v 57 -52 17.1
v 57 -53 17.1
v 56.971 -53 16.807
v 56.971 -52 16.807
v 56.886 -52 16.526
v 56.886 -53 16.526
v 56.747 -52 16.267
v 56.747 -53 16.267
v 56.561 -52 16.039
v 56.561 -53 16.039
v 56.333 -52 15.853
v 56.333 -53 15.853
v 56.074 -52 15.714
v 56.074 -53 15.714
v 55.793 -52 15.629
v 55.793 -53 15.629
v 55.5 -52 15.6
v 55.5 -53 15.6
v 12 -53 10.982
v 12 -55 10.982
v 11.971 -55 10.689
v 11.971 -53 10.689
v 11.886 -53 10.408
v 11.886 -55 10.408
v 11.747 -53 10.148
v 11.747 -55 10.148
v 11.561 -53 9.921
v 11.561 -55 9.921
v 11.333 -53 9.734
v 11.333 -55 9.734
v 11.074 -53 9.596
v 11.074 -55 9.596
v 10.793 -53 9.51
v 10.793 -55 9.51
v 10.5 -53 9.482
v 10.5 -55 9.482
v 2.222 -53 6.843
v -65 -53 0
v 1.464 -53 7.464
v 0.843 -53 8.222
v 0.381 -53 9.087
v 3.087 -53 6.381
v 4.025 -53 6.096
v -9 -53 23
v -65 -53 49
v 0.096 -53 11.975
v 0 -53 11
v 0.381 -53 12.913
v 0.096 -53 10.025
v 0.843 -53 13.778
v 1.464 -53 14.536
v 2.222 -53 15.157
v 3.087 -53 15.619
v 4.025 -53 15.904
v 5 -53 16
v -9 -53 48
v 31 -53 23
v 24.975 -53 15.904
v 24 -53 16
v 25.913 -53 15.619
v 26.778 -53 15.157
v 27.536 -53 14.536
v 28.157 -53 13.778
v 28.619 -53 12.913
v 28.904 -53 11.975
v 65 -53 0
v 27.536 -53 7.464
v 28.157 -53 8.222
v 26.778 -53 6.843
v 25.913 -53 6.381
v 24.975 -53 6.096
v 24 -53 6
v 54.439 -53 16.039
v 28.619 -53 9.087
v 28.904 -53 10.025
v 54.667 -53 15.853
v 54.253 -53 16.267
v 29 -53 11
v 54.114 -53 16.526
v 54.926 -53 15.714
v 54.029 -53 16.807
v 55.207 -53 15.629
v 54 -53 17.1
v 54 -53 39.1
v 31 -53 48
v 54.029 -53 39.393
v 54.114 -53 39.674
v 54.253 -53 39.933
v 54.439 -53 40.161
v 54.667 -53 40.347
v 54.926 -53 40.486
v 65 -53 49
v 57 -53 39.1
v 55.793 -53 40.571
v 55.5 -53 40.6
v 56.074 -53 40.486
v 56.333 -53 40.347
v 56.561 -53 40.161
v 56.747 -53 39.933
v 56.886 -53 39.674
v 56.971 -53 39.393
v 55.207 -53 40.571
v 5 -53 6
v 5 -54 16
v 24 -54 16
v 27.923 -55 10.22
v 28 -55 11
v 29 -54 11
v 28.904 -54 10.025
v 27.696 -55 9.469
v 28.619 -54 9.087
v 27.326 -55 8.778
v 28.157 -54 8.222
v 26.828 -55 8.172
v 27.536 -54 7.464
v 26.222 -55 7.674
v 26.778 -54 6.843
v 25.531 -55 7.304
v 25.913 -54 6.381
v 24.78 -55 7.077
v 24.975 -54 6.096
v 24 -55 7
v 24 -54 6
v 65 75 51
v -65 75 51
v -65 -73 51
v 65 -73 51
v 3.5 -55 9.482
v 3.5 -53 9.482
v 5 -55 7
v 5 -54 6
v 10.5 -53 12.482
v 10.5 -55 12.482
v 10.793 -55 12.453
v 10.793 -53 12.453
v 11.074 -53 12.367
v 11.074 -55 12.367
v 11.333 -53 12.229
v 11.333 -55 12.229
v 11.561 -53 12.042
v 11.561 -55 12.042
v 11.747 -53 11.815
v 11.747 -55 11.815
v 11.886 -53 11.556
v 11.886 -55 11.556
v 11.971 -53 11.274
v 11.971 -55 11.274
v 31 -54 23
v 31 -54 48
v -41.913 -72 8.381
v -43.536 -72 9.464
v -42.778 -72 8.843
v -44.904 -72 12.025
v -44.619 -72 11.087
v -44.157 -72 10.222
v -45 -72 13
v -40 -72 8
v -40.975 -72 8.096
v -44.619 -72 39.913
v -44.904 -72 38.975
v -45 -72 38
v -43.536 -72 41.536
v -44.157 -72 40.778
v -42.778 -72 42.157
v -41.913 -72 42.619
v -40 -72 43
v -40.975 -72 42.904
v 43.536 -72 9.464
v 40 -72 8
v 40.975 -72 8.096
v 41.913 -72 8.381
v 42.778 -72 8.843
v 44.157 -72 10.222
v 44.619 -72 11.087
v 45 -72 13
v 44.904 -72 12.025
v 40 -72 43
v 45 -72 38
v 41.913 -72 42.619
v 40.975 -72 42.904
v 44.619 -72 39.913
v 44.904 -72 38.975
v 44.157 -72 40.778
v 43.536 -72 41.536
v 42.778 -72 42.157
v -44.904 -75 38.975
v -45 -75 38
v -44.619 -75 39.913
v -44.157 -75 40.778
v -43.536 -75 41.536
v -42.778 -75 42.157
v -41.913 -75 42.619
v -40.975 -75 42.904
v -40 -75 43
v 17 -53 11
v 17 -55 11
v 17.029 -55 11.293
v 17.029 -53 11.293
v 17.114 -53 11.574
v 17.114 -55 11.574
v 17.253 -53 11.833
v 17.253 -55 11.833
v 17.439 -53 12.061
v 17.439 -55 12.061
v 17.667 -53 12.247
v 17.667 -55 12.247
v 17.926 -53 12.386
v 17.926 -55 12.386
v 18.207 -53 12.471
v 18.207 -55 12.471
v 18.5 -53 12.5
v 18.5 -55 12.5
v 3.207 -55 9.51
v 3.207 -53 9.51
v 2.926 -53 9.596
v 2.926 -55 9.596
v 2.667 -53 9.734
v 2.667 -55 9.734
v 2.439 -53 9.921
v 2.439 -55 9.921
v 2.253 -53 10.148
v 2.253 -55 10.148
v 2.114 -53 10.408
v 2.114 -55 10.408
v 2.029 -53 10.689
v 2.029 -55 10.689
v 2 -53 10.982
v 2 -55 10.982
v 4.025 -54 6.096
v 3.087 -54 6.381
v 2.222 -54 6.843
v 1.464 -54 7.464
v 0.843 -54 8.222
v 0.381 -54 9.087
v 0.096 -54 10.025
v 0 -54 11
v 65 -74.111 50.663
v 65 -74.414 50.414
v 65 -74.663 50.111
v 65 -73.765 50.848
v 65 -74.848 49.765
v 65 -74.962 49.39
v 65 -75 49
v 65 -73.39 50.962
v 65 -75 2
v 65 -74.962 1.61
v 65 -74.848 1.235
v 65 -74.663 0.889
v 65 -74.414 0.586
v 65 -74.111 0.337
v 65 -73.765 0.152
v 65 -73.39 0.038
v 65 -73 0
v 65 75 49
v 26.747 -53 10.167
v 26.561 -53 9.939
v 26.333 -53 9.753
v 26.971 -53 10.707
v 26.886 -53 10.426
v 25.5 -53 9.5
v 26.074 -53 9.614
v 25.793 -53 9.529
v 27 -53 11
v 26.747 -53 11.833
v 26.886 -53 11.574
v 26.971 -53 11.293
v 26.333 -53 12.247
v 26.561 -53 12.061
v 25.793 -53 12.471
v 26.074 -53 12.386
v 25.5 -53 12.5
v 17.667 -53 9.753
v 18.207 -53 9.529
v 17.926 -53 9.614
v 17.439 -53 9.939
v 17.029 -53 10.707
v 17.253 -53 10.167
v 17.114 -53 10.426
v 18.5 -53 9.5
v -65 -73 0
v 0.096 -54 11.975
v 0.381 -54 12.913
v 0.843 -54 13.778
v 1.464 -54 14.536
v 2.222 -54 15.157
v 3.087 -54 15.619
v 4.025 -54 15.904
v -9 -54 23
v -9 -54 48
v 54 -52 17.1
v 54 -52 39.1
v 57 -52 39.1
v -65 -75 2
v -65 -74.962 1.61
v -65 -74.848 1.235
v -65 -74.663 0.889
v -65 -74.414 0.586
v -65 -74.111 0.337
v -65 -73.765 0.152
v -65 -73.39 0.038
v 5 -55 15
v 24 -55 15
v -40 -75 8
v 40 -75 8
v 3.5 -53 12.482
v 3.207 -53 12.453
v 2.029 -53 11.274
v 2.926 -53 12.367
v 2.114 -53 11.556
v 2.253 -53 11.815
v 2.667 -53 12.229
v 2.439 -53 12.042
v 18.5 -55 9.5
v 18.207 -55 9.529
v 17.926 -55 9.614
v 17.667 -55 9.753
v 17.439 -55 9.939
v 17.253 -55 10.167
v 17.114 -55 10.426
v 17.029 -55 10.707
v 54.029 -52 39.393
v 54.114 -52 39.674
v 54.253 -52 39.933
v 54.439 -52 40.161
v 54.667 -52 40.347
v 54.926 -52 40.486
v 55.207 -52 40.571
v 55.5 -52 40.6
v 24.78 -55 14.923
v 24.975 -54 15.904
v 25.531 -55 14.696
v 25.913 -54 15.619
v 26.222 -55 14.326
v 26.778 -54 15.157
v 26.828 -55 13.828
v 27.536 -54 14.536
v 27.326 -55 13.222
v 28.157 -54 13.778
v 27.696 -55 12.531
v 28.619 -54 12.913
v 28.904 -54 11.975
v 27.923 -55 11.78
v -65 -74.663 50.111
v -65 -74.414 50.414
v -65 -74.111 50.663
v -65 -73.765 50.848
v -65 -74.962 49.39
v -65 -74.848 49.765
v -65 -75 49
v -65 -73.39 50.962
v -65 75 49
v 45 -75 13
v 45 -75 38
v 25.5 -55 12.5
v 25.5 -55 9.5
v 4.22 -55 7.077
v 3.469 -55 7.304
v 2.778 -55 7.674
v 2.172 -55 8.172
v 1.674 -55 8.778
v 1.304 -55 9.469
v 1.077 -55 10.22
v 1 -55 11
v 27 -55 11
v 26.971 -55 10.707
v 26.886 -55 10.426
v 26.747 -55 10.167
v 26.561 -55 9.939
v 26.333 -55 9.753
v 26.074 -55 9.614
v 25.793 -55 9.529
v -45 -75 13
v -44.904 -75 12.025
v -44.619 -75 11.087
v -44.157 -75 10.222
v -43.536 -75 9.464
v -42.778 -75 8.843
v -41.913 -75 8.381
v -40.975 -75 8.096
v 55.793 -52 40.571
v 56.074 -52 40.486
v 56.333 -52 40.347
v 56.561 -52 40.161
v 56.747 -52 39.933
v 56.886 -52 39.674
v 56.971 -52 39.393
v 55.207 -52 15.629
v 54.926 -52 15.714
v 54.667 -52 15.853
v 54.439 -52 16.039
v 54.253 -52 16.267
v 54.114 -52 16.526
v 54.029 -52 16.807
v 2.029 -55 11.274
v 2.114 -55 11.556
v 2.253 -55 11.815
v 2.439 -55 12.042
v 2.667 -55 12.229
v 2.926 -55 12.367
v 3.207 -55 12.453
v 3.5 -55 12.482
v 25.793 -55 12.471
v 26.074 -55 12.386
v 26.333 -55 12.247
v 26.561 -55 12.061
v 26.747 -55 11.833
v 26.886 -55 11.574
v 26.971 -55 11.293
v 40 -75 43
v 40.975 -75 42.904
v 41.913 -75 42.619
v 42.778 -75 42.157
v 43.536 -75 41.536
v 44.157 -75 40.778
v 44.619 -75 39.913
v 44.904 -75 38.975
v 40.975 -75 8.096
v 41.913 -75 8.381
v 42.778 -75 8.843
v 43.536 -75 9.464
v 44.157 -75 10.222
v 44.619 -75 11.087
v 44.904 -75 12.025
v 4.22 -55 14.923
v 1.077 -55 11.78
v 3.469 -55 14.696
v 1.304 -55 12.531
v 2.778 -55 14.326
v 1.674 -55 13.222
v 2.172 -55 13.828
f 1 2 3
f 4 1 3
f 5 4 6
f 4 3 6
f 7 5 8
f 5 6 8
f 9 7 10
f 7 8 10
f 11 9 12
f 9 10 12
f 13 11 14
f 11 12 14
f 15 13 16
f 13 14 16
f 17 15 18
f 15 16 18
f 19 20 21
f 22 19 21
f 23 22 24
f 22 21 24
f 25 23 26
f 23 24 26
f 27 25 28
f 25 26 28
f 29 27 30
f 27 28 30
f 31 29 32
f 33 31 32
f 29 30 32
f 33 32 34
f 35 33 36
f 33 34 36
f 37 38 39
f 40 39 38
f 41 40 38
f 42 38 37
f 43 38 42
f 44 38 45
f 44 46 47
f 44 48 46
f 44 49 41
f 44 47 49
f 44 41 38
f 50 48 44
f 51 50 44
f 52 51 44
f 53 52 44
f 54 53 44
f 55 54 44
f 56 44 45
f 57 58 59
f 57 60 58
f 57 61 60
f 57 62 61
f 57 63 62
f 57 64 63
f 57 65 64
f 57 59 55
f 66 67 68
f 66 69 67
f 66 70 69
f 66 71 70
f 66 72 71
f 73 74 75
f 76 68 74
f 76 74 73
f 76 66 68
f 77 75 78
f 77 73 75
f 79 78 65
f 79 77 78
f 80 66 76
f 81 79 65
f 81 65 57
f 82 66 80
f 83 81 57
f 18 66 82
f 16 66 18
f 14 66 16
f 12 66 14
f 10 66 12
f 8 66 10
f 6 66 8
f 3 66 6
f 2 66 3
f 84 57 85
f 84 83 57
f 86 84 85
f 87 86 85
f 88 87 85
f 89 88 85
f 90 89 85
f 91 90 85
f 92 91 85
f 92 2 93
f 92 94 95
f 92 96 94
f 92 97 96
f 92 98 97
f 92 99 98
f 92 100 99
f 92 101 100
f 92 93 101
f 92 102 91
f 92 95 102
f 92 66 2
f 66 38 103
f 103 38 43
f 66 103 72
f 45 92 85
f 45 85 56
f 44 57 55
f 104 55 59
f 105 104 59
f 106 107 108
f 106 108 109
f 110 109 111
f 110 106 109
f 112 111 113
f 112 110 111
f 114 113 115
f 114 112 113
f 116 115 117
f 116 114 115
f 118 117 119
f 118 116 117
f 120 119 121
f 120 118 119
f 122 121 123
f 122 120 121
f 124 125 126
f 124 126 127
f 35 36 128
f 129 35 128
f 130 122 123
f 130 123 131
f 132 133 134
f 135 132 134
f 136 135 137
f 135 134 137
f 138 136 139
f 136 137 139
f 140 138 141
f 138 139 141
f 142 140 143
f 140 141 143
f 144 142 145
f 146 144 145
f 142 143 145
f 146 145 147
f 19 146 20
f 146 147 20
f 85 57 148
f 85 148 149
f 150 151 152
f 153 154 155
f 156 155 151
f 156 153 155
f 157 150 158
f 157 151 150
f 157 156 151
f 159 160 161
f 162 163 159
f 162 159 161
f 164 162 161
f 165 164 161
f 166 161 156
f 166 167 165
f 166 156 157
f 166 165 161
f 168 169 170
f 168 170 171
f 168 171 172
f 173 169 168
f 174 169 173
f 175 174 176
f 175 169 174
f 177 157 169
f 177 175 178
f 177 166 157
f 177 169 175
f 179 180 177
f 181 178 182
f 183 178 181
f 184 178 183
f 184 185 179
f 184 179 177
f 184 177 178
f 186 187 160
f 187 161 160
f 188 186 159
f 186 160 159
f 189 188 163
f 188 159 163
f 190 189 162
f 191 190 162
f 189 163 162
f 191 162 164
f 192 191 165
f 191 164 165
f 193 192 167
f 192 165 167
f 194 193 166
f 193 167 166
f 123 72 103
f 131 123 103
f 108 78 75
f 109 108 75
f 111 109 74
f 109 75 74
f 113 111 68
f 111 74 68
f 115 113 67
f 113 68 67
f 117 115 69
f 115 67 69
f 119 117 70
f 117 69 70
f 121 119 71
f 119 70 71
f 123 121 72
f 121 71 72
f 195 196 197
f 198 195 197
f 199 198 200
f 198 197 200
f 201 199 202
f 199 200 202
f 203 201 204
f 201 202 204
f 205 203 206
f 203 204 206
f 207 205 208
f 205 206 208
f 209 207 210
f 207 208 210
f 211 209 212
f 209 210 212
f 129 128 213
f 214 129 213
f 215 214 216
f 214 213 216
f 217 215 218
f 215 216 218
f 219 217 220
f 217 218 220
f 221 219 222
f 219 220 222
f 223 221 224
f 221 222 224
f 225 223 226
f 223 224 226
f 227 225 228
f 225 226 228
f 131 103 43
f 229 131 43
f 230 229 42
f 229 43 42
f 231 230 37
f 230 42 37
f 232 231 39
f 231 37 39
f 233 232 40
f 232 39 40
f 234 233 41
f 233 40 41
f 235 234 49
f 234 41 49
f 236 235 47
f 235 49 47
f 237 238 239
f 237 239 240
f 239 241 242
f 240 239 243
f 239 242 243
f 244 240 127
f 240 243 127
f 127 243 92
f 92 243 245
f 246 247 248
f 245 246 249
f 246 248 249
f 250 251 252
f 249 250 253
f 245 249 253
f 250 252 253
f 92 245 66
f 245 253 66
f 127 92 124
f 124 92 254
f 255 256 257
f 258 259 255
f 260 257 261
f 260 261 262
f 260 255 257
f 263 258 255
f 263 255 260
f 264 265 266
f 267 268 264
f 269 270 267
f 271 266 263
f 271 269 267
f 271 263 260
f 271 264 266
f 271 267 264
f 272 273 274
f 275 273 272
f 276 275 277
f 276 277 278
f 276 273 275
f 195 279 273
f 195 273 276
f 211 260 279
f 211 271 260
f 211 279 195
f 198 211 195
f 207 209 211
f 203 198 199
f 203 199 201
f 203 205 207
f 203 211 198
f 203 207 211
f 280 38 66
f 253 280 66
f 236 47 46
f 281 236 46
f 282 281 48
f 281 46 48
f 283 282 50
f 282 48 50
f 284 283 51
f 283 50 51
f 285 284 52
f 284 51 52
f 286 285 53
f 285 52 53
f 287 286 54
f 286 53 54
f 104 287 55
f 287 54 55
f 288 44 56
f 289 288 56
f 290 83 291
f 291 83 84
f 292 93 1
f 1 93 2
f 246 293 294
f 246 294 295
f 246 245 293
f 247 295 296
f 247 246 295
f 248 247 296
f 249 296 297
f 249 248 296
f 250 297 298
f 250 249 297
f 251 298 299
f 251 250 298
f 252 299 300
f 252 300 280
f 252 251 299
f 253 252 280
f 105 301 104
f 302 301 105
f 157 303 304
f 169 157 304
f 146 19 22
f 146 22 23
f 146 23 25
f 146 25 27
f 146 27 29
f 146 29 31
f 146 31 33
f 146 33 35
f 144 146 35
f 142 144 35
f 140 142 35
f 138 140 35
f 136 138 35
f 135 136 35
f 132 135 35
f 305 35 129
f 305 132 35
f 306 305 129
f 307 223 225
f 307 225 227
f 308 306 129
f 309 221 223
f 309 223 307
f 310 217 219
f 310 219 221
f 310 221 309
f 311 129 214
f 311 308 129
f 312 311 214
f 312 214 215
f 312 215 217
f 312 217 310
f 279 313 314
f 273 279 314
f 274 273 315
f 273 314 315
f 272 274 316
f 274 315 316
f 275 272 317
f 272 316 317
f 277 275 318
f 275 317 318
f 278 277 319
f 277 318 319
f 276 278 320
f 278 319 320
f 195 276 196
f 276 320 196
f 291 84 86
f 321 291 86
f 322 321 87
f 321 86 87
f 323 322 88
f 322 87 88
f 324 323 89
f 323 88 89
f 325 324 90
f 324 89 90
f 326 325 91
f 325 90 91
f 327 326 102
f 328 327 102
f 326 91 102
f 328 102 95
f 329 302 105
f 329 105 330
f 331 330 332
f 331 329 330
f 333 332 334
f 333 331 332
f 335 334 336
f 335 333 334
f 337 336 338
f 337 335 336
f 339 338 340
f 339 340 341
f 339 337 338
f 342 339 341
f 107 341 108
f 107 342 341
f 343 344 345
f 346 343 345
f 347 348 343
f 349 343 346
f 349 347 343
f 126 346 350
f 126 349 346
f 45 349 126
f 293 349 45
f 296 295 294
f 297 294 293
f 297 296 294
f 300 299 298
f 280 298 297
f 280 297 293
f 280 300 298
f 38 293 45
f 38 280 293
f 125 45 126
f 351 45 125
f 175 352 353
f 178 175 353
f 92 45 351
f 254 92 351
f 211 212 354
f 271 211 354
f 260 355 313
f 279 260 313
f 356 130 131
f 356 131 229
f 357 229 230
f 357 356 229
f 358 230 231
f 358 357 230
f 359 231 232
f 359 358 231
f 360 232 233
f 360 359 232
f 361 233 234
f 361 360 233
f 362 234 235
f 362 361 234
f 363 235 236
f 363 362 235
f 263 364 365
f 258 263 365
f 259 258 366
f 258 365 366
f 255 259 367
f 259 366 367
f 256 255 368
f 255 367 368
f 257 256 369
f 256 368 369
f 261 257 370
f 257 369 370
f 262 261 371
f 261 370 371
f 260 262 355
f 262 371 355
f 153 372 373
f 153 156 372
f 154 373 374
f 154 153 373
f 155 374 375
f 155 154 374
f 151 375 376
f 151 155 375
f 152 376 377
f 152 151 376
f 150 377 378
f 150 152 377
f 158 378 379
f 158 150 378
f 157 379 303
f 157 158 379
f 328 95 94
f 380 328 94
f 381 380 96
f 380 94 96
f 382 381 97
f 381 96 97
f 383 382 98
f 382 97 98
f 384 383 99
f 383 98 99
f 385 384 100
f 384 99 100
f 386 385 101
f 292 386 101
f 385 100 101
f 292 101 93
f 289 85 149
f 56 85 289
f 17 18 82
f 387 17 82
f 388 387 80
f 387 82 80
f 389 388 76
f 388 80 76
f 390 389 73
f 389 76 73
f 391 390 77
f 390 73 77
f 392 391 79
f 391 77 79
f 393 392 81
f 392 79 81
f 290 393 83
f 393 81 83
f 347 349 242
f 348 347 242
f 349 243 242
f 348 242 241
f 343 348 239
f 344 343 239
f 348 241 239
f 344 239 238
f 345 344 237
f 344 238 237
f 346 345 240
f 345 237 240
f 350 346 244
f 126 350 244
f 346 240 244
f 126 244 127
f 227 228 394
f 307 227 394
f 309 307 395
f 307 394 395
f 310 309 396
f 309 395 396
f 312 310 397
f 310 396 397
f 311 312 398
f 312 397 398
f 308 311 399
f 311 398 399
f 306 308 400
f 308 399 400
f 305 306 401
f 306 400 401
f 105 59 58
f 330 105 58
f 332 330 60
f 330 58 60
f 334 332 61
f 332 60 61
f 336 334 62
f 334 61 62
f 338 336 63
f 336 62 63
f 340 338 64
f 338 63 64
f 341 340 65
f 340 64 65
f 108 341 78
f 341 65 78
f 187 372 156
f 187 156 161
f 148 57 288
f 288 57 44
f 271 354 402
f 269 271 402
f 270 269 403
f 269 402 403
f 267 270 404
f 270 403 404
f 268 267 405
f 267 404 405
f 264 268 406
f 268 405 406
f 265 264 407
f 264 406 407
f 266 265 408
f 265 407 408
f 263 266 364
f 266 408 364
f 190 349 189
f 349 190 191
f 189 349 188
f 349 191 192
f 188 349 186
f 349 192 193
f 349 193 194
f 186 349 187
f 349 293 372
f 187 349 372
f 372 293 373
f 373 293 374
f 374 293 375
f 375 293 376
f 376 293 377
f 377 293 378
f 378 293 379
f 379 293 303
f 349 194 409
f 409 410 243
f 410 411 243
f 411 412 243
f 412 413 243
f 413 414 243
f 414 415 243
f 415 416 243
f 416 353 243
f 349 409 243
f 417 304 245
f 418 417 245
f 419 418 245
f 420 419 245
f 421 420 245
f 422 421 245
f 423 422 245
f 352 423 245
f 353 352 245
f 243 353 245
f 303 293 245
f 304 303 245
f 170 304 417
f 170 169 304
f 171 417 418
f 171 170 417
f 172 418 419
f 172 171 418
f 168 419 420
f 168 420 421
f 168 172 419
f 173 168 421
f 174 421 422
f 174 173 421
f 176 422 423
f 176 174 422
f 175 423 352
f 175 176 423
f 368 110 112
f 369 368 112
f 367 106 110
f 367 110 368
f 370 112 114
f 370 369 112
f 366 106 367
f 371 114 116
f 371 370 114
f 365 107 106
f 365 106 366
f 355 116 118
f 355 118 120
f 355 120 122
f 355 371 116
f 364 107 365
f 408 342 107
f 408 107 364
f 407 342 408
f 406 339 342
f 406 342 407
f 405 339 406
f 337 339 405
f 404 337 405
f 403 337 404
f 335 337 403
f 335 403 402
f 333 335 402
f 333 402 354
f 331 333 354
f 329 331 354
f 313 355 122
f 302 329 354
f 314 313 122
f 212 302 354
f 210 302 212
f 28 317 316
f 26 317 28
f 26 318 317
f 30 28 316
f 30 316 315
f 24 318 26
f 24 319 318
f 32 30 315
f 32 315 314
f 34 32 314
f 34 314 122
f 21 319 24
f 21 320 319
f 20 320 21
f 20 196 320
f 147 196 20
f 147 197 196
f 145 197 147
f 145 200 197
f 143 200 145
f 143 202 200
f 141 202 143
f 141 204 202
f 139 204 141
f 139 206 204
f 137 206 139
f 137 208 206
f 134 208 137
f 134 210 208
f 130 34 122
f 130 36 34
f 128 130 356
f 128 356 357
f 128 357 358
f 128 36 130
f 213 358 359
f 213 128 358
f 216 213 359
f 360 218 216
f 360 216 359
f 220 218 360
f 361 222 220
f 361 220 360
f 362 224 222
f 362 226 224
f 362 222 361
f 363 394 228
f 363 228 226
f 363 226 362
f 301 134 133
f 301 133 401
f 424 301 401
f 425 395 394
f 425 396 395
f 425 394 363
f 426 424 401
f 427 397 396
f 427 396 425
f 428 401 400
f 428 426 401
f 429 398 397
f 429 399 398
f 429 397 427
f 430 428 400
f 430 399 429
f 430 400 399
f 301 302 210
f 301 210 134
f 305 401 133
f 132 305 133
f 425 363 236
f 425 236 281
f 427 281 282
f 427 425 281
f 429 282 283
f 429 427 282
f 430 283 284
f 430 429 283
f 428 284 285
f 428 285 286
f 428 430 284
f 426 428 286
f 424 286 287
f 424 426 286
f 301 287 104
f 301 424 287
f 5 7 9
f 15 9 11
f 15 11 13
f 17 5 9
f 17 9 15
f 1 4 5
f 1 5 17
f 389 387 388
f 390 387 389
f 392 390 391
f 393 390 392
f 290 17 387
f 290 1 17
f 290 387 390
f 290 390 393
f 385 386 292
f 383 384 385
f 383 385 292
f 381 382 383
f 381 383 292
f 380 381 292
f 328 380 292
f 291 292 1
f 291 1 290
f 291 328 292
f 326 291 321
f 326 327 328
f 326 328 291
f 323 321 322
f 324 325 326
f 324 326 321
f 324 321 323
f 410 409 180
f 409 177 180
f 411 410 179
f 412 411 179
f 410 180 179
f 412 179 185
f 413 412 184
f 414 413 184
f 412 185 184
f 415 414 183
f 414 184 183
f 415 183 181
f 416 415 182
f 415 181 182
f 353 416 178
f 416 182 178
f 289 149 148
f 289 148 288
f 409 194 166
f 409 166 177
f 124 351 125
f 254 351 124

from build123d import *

# Parameters (mm, degrees)
F0_W      = 130
F0_H      = 150
F1_DEPTH  = 51
F2_W      = 128
F2_H      = 49
F3_DEPTH  = 130.001
F4_W      = 90
F4_H      = 35
F5_DEPTH  = 3
F6_R      = 5
F7_R      = 5
F8_R      = 2
F9_R      = 2
F11_DEPTH = 1
F12_W     = 40
F12_H     = 25
F13_DEPTH = 1
F15_DEPTH = 2
F16_SIZE  = 1
F18_DEPTH = 2


with BuildPart() as f1:
    # F0 (on Top) → F1 (new body)
    with BuildSketch(Plane.XY):
        Rectangle(F0_W, F0_H)
    extrude(amount=F1_DEPTH)

    # F2 (on face) → F3 (cut, through all)
    with BuildSketch(Plane.YZ.offset(65)):
        with Locations((11, 24.5)):
            Rectangle(F2_W, F2_H)
    extrude(amount=-F3_DEPTH, mode=Mode.SUBTRACT)

    # F4 (on face) → F5 (cut)
    with BuildSketch(Plane.XZ.offset(75)):
        with Locations((0, 25.5)):
            Rectangle(F4_W, F4_H)
    extrude(amount=-F5_DEPTH, mode=Mode.SUBTRACT)

    # F6
    f6_edges = [f1.edges().sort_by_distance(p)[0] for p in [
        (-45, -73.5, 43),
    ]]
    fillet(f6_edges, radius=F6_R)

    # F7
    f7_edges = [f1.edges().sort_by_distance(p)[0] for p in [
        (45, -73.5, 43),
        (45, -73.5, 8),
        (-45, -73.5, 8),
    ]]
    fillet(f7_edges, radius=F7_R)

    # F8
    f8_edges = [f1.edges().sort_by_distance(p)[0] for p in [
        (0, -75, 0),
    ]]
    fillet(f8_edges, radius=F8_R)

    # F9
    f9_edges = [f1.edges().sort_by_distance(p)[0] for p in [
        (0, -75, 51),
    ]]
    fillet(f9_edges, radius=F9_R)

    # F10 (on face) → F11 (join)
    with BuildSketch(Plane(origin=(0, -53, 0), x_dir=(-1, 0, 0), z_dir=(0, 1, 0))):
        with BuildLine():
            Line((-57, 39.1), (-57, 17.1))
            ThreePointArc((-57, 17.1), (-56.5606601718, 16.0393398282), (-55.5, 15.6))
            ThreePointArc((-55.5, 15.6), (-54.4393398282, 16.0393398282), (-54, 17.1))
            Line((-54, 17.1), (-54, 39.1))
            ThreePointArc((-54, 39.1), (-54.4393398282, 40.1606601718), (-55.5, 40.6))
            ThreePointArc((-55.5, 40.6), (-56.5606601718, 40.1606601718), (-57, 39.1))
        make_face()
    extrude(amount=F11_DEPTH)

    # F12 (on face) → F13 (cut)
    with BuildSketch(Plane(origin=(0, -53, 0), x_dir=(-1, 0, 0), z_dir=(0, 1, 0))):
        with Locations((-11, 35.5)):
            Rectangle(F12_W, F12_H)
    extrude(amount=-F13_DEPTH, mode=Mode.SUBTRACT)

    # F14 (on face) → F15 (cut)
    with BuildSketch(Plane(origin=(0, -53, 0), x_dir=(-1, 0, 0), z_dir=(0, 1, 0))):
        with BuildLine():
            Line((-24, 16), (-24, 6))
            Line((-24, 6), (-5, 6))
            ThreePointArc((-5, 6), (-1.4644660941, 7.4644660941), (0, 11))
            ThreePointArc((0, 11), (-1.4644660941, 14.5355339059), (-5, 16))
            Line((-5, 16), (-24, 16))
        make_face()
        with BuildLine():
            ThreePointArc((-24, 16), (-27.5355339059, 14.5355339059), (-29, 11))
            ThreePointArc((-29, 11), (-27.5355339059, 7.4644660941), (-24, 6))
            Line((-24, 6), (-24, 16))
        make_face()
    extrude(amount=-F15_DEPTH, mode=Mode.SUBTRACT)

    # F16
    f16_edges = [f1.edges().sort_by_distance(p)[0] for p in [
        (29, -55, 11),
        (14.5, -55, 16),
        (0, -55, 11),
        (14.5, -55, 6),
    ]]
    chamfer(f16_edges, length=F16_SIZE)

    # F17 (on face) → F18 (join)
    with BuildSketch(Plane(origin=(0, -55, 0), x_dir=(-1, 0, 0), z_dir=(0, 1, 0))):
        with BuildLine():
            Line((-27, 11), (-24, 11))
            Line((-24, 11), (-17, 11))
            ThreePointArc((-17, 11), (-17.4393398282, 12.0606601718), (-18.5, 12.5))
            Line((-18.5, 12.5), (-25.5, 12.5))
            ThreePointArc((-25.5, 12.5), (-26.5606601718, 12.0606601718), (-27, 11))
        make_face()
        with BuildLine():
            Line((-17, 11), (-24, 11))
            Line((-24, 11), (-27, 11))
            ThreePointArc((-27, 11), (-26.5606601718, 9.9393398282), (-25.5, 9.5))
            Line((-25.5, 9.5), (-18.5, 9.5))
            ThreePointArc((-18.5, 9.5), (-17.4393398282, 9.9393398282), (-17, 11))
        make_face()
        with BuildLine():
            ThreePointArc((-10.5000000544, 12.4815619213), (-11.5606602262, 12.042222093), (-12.0000000544, 10.9815619213))
            ThreePointArc((-12.0000000544, 10.9815619213), (-11.5606602262, 9.9209017495), (-10.5000000544, 9.4815619213))
            Line((-10.5000000544, 9.4815619213), (-3.5000000544, 9.4815619213))
            ThreePointArc((-3.5000000544, 9.4815619213), (-2.4393398827, 9.9209017495), (-2.0000000544, 10.9815619213))
            ThreePointArc((-2.0000000544, 10.9815619213), (-2.4393398827, 12.042222093), (-3.5000000544, 12.4815619213))
            Line((-3.5000000544, 12.4815619213), (-10.5000000544, 12.4815619213))
        make_face()
    extrude(amount=F18_DEPTH)


solid = f1.part
